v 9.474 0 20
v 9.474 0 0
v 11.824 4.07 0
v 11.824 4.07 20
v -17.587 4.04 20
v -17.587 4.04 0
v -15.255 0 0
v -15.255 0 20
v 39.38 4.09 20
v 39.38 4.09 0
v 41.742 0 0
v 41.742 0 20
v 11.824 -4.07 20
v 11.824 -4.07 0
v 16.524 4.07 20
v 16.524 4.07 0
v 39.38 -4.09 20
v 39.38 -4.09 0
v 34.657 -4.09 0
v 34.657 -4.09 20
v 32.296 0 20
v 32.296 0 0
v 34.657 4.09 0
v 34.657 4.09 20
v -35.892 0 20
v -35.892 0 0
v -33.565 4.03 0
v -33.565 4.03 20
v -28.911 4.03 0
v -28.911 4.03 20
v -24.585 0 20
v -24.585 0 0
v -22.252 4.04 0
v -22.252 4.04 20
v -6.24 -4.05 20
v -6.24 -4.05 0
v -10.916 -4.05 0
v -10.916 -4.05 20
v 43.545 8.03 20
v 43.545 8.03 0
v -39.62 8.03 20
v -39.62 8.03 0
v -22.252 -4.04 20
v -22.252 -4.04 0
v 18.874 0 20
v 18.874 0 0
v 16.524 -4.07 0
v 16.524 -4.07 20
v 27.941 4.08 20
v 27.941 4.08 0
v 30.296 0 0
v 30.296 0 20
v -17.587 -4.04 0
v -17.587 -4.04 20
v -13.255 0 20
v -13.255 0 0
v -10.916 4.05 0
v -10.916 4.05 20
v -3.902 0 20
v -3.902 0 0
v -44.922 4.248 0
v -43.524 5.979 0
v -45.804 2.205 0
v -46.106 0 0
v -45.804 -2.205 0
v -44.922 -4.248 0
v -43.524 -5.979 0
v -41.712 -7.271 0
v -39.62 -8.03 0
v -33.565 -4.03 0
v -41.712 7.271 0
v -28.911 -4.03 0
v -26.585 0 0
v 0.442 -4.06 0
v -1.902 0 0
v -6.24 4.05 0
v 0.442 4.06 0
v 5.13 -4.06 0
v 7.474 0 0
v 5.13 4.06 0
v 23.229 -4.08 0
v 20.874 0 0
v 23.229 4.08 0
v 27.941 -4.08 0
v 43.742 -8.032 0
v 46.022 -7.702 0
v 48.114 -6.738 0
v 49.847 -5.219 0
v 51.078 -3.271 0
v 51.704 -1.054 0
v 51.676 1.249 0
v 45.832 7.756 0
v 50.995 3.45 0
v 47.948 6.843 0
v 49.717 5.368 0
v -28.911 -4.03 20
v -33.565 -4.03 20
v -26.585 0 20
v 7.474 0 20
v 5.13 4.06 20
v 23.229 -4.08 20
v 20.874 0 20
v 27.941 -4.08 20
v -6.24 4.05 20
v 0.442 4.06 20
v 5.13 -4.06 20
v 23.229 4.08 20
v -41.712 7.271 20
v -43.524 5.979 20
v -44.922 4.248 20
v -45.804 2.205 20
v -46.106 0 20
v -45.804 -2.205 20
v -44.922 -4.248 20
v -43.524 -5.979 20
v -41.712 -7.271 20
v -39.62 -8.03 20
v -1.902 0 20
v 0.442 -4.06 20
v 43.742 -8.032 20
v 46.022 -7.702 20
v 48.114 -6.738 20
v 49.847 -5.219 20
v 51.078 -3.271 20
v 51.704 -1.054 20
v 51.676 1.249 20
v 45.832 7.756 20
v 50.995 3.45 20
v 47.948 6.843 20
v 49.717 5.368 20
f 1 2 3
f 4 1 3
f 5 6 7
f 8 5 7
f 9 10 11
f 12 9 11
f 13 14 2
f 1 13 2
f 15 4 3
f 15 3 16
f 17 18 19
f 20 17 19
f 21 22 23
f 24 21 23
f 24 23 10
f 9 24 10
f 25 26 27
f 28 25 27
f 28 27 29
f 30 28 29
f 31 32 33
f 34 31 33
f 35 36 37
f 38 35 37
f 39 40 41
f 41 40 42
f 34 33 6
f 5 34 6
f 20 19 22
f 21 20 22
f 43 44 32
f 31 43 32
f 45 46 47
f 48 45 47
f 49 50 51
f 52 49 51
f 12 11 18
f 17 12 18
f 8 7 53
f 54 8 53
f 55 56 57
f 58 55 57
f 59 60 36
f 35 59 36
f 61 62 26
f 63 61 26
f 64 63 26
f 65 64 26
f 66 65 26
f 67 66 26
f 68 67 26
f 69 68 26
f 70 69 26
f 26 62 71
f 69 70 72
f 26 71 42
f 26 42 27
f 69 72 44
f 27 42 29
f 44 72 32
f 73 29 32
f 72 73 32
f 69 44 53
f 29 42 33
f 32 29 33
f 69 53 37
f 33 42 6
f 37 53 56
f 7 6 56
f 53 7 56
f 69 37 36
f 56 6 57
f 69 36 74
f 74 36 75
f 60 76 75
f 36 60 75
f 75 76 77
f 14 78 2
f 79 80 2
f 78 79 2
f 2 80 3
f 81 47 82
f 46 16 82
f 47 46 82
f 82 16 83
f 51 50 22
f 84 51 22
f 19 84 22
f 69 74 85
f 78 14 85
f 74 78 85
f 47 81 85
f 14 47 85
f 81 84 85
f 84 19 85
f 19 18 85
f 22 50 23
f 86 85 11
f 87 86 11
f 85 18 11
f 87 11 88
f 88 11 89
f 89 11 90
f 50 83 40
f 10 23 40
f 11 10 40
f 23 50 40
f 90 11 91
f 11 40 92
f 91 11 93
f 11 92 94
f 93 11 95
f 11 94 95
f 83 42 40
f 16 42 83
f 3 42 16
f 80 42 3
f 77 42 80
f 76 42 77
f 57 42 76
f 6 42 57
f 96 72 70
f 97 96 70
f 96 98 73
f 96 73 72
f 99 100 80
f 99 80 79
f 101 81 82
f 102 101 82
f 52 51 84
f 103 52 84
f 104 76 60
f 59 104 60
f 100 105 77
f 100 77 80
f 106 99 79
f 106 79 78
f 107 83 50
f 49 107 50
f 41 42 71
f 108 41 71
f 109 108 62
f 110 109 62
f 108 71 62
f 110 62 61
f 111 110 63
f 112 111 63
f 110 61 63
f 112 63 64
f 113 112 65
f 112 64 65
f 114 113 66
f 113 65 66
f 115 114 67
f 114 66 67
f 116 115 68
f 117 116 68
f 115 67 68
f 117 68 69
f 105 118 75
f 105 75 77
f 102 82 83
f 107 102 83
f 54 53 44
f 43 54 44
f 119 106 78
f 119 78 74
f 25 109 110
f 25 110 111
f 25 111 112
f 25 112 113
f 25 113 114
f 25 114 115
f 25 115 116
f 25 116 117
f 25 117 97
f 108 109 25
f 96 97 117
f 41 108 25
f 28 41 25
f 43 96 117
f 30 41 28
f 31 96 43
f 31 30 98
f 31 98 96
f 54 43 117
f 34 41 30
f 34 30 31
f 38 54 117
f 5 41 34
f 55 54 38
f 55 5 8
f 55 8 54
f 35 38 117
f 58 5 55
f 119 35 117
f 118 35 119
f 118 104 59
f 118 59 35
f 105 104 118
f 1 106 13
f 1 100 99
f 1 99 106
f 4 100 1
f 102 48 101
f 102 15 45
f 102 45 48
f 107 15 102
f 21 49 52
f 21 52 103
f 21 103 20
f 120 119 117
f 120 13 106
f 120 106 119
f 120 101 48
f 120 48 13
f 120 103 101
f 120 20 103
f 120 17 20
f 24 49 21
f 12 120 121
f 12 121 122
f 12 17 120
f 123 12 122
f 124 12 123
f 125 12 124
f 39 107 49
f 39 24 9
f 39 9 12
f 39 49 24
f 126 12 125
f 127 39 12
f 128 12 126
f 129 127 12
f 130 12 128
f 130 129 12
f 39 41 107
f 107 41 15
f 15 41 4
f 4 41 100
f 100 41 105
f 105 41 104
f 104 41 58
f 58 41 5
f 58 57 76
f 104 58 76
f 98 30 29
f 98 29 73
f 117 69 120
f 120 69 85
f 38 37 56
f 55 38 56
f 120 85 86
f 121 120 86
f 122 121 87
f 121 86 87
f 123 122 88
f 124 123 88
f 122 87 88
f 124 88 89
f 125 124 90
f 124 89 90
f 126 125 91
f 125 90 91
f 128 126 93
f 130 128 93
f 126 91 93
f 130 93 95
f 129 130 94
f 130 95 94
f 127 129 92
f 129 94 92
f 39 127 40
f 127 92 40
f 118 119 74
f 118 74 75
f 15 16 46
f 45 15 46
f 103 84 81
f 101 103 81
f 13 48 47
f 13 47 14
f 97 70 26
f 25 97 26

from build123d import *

# Parameters (mm, degrees)
F1_DEPTH = 20


with BuildPart() as f1:
    # F0 (on Top) → F1 (new body)
    with BuildSketch(Plane.XY):
        with BuildLine():
            Line((43.544571, 8.03), (-39.620463, 8.03))
            ThreePointArc((-39.620463, 8.03), (-46.105617, 0), (-39.620463, -8.03))
            Line((-39.620463, -8.03), (43.741562, -8.032416))
            ThreePointArc((43.741562, -8.032416), (51.773374, 0.098503), (43.544571, 8.03))
        make_face()
        Polygon((-26.58473, 0), (-28.911452, -4.03), (-33.564895, -4.03), (-35.891616, 0), (-33.564895, 4.03), (-28.911452, 4.03), align=None, mode=Mode.SUBTRACT)
        Polygon((-22.252235, 4.04), (-17.587245, 4.04), (-15.25475, 0), (-17.587245, -4.04), (-22.252235, -4.04), (-24.58473, 0), align=None, mode=Mode.SUBTRACT)
        Polygon((-13.25475, 0), (-10.916481, 4.05), (-6.239944, 4.05), (-3.901675, 0), (-6.239944, -4.05), (-10.916481, -4.05), align=None, mode=Mode.SUBTRACT)
        Polygon((-1.901675, 0), (0.442367, 4.06), (5.130451, 4.06), (7.474493, 0), (5.130451, -4.06), (0.442367, -4.06), align=None, mode=Mode.SUBTRACT)
        Polygon((9.474493, 0), (11.824309, 4.07), (16.52394, 4.07), (18.873755, 0), (16.52394, -4.07), (11.824309, -4.07), align=None, mode=Mode.SUBTRACT)
        Polygon((20.873755, 0), (23.229345, 4.08), (27.940523, 4.08), (30.296112, 0), (27.940523, -4.08), (23.229345, -4.08), align=None, mode=Mode.SUBTRACT)
        Polygon((32.296112, 0), (34.657474, 4.09), (39.3802, 4.09), (41.741562, 0), (39.3802, -4.09), (34.657474, -4.09), align=None, mode=Mode.SUBTRACT)
    extrude(amount=F1_DEPTH)


solid = f1.part
